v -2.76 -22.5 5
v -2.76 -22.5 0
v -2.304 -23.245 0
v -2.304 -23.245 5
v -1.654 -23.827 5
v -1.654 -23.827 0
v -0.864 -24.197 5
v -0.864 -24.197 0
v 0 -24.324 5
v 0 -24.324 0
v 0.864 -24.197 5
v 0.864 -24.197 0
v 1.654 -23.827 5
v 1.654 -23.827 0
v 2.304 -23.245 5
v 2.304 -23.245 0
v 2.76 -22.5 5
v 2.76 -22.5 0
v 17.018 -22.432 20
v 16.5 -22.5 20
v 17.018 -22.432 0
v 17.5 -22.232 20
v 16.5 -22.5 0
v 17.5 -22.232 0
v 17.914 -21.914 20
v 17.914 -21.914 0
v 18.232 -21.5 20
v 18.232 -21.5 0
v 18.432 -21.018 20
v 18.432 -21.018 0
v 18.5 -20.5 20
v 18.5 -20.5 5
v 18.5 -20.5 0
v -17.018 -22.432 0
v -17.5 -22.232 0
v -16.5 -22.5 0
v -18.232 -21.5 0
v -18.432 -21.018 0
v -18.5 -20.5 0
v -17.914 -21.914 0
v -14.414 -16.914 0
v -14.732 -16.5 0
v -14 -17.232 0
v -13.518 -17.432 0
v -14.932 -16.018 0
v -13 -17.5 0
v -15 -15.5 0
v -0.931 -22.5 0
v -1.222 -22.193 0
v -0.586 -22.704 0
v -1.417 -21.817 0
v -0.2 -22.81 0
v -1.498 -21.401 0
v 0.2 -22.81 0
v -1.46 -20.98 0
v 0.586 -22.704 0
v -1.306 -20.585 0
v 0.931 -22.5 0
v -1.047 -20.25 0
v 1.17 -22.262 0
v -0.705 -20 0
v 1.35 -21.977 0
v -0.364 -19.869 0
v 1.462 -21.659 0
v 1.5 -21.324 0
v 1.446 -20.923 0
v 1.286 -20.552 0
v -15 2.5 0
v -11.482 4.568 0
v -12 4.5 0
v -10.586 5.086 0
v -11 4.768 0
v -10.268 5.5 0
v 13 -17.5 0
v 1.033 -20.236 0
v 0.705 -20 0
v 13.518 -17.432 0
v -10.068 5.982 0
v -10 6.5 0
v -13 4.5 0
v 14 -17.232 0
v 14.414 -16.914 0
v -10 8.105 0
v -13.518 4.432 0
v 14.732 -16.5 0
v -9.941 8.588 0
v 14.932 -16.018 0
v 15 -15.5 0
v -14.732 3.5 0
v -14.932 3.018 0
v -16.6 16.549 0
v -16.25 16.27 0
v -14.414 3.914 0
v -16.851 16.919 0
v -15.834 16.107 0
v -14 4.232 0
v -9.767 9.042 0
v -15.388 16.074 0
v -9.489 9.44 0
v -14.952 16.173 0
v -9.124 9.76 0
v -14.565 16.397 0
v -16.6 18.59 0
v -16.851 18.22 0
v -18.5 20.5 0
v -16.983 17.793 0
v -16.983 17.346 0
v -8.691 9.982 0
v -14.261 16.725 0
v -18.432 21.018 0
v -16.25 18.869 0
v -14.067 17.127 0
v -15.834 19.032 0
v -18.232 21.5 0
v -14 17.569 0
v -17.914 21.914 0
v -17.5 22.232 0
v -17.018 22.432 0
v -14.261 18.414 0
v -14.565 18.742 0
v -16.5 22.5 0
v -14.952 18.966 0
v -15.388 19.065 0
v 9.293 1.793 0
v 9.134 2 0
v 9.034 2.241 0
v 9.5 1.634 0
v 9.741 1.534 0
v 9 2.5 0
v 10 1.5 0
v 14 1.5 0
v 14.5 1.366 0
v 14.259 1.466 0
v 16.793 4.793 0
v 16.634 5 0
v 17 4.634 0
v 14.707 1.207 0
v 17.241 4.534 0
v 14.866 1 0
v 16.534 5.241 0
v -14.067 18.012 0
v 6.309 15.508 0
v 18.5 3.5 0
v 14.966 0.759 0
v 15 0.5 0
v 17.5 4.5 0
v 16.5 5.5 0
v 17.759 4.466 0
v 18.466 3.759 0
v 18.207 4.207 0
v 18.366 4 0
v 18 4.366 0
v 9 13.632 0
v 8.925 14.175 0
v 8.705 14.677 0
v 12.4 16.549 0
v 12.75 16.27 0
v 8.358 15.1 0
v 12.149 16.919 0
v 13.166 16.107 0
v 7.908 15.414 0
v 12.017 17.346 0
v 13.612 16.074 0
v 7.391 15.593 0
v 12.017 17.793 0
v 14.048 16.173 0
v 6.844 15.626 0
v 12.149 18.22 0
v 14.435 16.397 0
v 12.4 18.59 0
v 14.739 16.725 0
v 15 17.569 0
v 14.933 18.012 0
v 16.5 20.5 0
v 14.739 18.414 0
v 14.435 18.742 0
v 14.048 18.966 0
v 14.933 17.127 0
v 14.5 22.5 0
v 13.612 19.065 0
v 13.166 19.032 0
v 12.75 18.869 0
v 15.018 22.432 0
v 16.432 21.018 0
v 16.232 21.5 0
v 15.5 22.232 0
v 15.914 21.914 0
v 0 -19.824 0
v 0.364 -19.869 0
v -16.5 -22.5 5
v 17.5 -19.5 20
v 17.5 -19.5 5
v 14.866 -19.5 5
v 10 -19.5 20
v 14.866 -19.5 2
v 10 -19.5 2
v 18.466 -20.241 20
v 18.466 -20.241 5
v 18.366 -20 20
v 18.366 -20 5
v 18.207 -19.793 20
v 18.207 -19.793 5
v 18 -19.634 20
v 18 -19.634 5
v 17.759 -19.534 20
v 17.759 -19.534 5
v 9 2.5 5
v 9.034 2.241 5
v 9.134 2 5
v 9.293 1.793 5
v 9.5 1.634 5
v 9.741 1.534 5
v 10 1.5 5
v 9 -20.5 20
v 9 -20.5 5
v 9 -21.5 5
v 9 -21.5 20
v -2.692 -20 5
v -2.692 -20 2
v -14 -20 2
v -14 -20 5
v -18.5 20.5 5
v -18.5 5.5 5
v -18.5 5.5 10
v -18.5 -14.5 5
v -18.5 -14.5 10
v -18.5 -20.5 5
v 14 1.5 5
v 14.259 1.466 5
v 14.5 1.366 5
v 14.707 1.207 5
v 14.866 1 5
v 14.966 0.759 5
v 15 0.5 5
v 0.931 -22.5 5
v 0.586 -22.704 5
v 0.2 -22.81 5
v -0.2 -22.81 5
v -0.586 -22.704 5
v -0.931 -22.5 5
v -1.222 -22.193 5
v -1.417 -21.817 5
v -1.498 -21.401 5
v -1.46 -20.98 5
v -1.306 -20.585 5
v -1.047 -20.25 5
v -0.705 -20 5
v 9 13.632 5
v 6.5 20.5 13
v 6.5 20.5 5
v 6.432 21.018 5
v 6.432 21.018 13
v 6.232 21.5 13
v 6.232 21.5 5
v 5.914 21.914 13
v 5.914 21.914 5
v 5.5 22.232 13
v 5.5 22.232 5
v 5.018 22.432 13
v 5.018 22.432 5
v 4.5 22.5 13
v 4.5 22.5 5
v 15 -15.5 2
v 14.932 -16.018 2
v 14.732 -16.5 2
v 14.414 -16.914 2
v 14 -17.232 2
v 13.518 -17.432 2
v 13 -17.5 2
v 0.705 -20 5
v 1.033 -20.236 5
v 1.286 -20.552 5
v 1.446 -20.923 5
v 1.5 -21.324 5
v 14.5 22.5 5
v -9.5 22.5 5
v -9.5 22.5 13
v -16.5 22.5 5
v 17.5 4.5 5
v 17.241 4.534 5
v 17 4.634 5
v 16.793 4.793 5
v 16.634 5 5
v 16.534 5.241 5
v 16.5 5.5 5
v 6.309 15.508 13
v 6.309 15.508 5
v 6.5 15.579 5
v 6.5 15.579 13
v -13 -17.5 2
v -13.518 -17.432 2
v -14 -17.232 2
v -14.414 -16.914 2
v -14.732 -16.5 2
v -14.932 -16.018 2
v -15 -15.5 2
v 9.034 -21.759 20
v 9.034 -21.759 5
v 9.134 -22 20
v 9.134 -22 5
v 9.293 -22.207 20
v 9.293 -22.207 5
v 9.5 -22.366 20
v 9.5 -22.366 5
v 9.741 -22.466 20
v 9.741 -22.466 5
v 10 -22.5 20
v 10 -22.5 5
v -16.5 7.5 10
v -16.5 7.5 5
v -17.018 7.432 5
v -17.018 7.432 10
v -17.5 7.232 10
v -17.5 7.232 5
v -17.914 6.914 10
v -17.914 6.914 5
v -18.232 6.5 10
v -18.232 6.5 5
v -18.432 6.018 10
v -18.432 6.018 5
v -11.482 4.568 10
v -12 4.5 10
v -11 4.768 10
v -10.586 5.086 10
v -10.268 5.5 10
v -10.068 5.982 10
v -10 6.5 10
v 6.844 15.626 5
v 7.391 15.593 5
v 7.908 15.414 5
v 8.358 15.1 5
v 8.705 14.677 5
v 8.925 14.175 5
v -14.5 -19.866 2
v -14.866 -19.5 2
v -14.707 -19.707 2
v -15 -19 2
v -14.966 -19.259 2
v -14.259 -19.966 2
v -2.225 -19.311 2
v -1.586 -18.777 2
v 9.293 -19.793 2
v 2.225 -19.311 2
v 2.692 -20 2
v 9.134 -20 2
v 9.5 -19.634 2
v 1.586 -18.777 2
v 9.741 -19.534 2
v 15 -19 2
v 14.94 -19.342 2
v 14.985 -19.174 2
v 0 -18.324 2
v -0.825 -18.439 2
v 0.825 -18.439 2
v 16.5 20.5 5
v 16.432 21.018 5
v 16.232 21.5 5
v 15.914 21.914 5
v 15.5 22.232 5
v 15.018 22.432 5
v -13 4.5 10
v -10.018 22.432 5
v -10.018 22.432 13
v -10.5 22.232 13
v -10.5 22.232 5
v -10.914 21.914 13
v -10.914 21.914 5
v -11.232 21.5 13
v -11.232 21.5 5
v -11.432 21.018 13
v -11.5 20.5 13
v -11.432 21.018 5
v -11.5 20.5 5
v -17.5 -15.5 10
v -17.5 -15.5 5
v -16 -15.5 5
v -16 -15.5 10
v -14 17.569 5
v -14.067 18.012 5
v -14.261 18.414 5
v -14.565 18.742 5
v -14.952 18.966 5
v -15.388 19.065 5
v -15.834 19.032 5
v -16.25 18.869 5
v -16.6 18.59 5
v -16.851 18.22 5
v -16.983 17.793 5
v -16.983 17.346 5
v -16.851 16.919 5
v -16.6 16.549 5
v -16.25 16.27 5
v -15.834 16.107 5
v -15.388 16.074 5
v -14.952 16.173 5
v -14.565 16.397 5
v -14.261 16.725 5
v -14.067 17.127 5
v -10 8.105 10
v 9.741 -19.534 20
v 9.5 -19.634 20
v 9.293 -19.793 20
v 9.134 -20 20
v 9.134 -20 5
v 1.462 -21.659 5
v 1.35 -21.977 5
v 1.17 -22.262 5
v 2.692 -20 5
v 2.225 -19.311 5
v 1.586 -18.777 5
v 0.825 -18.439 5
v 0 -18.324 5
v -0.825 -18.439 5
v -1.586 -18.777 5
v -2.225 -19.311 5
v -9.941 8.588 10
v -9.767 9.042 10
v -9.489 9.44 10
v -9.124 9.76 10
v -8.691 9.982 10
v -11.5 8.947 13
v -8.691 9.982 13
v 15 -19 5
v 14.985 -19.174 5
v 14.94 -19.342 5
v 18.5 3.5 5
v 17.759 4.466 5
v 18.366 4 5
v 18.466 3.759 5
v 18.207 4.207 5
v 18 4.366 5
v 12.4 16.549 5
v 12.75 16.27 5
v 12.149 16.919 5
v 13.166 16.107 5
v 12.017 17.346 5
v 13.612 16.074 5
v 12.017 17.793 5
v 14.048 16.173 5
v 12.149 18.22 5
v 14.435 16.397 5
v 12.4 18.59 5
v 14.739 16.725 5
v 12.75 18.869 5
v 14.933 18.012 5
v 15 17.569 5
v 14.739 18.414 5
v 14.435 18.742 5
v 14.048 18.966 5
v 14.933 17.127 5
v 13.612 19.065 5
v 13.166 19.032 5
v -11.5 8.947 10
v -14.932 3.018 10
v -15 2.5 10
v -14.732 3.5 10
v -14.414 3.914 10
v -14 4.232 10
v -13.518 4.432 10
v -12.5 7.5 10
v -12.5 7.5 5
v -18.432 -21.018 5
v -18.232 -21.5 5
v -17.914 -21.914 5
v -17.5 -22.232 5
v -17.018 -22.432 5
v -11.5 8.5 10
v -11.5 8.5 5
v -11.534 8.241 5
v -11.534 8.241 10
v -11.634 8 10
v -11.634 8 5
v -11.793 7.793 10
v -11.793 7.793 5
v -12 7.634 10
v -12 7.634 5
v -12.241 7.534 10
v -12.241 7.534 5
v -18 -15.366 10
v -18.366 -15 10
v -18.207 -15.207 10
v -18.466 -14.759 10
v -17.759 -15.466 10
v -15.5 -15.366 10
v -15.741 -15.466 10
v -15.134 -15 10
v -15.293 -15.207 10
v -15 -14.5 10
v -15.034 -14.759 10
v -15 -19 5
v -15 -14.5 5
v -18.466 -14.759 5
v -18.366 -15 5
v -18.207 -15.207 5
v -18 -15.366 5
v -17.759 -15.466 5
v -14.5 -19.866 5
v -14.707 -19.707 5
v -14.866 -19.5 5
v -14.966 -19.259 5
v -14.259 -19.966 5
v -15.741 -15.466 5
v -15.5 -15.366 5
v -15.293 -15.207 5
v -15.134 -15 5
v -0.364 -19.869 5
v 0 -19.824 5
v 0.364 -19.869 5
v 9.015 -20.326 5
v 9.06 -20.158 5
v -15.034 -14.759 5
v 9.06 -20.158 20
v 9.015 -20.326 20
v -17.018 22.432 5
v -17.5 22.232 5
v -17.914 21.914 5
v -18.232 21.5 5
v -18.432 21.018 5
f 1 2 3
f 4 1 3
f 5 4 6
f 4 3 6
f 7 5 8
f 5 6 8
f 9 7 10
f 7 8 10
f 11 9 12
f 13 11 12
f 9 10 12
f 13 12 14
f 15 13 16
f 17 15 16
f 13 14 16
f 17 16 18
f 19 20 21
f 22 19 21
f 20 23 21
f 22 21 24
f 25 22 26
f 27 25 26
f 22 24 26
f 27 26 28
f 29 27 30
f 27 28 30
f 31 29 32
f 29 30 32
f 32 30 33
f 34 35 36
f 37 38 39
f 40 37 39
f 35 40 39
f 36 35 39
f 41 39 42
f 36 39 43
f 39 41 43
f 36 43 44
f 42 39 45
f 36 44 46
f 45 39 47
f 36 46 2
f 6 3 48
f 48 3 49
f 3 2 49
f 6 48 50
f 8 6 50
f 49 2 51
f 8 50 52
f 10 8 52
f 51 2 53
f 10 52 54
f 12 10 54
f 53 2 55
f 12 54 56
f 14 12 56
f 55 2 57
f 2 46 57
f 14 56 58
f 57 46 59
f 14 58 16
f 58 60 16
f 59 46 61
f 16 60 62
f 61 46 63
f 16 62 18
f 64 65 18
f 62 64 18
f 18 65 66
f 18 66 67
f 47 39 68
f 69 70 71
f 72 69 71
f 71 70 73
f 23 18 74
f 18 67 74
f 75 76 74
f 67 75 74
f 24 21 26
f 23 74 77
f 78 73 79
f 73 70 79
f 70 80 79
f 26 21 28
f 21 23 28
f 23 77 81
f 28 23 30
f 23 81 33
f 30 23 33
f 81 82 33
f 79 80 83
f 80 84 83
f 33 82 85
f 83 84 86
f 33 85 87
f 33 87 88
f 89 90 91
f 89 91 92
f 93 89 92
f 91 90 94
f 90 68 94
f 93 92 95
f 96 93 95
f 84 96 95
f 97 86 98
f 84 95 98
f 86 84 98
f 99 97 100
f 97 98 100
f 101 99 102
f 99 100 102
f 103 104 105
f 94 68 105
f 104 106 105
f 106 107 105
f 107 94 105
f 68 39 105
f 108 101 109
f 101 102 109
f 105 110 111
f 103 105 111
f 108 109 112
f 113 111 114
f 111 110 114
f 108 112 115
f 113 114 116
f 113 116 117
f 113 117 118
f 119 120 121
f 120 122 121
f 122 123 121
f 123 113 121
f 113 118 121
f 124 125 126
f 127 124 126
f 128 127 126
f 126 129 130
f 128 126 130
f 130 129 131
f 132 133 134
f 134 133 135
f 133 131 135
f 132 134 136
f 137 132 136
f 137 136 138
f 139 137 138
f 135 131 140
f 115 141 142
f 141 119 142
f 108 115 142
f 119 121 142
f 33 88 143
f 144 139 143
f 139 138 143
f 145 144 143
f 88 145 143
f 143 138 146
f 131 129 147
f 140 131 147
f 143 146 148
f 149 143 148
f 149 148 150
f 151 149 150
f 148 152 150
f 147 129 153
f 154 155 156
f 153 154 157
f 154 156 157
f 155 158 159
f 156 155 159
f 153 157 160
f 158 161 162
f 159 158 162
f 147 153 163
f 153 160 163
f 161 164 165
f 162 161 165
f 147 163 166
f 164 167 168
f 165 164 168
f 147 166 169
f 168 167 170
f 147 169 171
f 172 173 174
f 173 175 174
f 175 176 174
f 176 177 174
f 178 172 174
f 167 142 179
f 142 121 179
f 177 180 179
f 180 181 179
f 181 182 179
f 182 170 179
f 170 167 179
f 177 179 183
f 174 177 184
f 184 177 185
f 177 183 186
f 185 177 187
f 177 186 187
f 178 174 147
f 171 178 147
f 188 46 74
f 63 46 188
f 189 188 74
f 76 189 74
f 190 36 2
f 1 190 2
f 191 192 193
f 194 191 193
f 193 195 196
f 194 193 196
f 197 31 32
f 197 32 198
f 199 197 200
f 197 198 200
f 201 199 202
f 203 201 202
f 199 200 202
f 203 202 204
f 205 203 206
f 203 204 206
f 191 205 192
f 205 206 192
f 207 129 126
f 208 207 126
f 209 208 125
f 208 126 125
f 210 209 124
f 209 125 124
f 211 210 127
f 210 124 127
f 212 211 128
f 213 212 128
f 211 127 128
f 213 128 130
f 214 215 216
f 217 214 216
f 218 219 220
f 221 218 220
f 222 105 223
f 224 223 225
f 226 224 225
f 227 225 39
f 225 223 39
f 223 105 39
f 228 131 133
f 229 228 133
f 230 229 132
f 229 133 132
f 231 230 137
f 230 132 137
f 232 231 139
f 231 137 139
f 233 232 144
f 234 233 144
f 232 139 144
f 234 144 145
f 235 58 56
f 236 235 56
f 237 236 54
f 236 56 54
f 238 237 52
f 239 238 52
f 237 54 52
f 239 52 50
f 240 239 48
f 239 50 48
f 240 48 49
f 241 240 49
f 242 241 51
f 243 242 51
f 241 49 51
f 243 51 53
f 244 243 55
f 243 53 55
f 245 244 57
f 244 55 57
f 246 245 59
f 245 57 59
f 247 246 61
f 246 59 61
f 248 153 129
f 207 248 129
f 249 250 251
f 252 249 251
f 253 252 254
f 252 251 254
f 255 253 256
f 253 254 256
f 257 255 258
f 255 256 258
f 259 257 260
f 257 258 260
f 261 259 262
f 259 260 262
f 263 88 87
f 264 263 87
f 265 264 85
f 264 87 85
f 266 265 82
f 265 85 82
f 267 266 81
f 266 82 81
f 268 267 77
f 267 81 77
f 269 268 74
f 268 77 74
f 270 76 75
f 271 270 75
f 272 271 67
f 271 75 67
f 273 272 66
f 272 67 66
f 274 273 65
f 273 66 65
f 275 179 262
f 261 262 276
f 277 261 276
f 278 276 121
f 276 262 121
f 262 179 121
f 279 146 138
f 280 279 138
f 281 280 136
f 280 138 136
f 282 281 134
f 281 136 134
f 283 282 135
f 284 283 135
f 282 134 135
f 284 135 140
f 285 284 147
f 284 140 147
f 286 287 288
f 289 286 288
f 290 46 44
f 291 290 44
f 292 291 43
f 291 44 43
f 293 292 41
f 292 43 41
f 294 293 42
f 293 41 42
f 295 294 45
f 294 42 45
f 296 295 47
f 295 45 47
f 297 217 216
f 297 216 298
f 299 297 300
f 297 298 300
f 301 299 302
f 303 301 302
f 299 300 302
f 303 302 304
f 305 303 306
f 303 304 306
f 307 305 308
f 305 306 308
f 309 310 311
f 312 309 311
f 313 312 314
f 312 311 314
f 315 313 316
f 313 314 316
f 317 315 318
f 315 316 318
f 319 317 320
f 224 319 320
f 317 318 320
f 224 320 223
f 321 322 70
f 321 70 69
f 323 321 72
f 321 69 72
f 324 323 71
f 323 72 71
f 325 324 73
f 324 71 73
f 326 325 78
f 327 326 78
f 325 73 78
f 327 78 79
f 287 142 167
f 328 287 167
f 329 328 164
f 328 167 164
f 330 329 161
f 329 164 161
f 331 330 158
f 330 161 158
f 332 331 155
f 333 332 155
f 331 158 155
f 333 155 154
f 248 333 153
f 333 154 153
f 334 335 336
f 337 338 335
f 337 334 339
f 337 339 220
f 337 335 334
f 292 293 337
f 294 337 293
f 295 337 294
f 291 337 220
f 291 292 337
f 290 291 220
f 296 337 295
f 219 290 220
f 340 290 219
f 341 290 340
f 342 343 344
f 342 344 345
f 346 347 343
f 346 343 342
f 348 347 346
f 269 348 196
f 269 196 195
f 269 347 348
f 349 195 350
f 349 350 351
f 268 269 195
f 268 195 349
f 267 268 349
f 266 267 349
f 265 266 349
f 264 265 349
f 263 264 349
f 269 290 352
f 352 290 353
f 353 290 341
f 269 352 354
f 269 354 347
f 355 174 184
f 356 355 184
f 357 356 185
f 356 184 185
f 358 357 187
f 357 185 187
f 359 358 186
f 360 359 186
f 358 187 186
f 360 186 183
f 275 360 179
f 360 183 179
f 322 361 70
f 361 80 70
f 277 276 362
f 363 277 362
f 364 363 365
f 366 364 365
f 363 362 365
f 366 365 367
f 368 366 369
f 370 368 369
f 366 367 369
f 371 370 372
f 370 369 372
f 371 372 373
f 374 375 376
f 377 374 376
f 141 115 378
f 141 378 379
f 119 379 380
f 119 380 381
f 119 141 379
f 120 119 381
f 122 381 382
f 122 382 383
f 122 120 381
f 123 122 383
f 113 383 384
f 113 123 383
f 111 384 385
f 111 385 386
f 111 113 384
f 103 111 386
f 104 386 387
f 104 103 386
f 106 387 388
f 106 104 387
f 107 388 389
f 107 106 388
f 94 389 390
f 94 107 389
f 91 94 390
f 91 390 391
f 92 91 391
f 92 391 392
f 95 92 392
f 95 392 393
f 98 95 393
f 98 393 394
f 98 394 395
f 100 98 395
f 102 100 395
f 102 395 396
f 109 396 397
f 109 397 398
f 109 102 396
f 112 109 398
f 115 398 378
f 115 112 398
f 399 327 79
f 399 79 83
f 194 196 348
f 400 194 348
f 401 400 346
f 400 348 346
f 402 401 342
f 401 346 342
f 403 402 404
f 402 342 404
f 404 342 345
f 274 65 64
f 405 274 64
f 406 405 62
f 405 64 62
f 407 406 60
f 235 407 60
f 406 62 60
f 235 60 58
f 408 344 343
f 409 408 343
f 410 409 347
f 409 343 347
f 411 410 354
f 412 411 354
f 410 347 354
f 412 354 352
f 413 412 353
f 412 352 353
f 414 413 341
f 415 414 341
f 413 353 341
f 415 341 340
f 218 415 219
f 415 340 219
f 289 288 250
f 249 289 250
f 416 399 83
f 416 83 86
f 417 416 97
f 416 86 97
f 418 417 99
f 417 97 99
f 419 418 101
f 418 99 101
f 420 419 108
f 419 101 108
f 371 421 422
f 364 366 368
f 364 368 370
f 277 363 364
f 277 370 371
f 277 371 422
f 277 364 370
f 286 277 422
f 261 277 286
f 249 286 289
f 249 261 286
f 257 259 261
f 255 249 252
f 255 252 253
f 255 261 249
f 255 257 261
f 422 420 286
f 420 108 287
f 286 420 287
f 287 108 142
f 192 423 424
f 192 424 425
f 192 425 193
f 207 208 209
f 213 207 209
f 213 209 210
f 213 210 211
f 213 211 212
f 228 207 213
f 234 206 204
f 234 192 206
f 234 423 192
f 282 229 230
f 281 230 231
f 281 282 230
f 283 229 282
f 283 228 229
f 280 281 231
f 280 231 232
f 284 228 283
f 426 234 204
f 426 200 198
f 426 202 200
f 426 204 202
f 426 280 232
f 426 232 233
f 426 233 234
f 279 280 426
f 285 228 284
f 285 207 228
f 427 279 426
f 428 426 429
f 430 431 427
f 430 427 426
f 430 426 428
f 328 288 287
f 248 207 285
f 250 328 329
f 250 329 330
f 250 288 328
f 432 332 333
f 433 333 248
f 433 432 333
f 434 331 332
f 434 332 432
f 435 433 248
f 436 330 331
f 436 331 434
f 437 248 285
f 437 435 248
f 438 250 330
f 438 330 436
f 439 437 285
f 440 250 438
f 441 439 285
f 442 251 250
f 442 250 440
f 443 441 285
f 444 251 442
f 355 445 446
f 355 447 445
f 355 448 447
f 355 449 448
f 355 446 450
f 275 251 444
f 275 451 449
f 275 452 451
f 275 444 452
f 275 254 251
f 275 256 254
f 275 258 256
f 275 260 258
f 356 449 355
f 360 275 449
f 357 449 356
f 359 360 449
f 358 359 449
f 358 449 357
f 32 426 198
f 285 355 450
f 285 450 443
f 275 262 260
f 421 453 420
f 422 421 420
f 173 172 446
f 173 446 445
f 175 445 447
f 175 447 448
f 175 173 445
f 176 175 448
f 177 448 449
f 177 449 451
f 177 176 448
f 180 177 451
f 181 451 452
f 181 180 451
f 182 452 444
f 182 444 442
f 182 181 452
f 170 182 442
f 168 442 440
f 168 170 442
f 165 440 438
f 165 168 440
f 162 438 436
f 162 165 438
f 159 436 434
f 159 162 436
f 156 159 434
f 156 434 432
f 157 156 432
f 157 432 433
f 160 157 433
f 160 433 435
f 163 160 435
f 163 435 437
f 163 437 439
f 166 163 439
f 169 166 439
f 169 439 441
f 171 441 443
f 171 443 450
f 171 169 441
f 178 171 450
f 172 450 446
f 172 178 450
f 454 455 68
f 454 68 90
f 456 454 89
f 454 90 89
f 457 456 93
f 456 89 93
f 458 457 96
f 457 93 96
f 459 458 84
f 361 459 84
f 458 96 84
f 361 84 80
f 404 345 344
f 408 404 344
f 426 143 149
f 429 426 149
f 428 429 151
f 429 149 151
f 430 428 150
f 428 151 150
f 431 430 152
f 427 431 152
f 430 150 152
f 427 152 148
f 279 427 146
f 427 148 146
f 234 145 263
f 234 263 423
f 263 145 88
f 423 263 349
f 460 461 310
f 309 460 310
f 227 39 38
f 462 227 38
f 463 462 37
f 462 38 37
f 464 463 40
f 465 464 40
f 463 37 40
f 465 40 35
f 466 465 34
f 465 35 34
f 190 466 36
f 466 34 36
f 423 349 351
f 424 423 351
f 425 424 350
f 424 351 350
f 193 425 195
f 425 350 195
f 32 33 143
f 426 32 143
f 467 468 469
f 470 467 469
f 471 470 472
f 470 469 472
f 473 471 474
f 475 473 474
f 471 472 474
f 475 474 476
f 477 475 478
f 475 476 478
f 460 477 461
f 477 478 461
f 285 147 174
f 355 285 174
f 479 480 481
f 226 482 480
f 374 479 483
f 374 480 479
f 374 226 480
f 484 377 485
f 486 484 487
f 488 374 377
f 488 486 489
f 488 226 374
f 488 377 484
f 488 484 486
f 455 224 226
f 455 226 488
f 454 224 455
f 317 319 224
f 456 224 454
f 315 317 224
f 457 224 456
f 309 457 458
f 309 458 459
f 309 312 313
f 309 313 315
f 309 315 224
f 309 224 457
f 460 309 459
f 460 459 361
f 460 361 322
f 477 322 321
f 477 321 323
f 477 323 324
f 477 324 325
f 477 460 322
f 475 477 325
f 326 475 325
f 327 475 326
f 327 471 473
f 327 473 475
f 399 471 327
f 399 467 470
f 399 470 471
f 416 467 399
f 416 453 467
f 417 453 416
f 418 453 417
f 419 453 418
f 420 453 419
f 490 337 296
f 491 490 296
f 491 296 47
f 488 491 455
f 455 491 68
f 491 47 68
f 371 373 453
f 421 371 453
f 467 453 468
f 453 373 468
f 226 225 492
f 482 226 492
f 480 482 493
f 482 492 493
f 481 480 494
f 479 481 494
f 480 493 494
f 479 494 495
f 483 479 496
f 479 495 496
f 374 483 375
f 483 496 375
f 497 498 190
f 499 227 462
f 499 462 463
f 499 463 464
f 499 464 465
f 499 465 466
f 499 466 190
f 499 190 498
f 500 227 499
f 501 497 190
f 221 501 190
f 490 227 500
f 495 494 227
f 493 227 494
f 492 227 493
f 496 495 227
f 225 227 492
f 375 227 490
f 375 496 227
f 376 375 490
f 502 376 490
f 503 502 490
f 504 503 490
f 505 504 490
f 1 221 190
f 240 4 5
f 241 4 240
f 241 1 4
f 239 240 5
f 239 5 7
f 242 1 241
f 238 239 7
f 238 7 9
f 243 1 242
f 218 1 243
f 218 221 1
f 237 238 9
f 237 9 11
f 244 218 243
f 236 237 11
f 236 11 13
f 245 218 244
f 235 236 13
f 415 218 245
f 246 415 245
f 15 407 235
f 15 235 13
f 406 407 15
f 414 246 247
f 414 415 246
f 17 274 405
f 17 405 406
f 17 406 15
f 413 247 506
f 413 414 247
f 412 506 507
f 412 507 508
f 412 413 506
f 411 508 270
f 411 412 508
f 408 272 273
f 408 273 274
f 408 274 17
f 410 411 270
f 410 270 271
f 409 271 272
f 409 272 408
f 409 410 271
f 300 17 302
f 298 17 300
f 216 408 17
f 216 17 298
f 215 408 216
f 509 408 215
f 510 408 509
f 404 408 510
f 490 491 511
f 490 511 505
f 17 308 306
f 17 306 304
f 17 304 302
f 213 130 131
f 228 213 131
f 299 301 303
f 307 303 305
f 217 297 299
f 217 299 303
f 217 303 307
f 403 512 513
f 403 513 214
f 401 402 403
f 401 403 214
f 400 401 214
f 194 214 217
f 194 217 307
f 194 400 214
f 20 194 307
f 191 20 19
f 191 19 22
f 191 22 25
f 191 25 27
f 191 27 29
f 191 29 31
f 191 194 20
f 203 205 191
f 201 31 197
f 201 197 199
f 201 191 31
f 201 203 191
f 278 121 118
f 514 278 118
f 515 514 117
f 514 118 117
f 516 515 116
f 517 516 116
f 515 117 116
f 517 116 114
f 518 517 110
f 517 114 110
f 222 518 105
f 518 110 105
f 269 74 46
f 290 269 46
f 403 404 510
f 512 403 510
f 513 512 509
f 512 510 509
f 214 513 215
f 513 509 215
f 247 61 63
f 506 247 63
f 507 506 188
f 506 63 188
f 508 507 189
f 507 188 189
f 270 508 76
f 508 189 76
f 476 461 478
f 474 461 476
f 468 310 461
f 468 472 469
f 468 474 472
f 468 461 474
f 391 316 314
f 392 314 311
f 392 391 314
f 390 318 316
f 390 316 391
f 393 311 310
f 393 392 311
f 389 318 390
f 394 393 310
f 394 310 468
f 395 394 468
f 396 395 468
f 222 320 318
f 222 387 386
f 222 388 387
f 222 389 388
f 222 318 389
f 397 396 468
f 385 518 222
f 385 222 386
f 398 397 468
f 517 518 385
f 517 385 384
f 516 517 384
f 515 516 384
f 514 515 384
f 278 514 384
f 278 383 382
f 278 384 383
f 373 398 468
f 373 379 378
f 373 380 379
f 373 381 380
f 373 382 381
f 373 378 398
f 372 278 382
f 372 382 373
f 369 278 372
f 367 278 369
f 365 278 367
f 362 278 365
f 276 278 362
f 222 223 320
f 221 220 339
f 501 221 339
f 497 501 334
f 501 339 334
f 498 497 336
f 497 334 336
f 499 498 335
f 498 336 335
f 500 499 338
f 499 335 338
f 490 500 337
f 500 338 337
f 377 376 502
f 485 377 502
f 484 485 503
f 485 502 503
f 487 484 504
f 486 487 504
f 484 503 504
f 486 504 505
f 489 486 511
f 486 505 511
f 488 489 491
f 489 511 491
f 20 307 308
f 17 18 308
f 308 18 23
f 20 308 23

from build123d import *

# Parameters (mm, degrees)
F1_DEPTH = 2
F0_R     = 3
F0_R_2   = 1.5
F2_DEPTH = 5
F4_DEPTH = 5
F5_DEPTH = 8
F6_DEPTH = 4
F7_DEPTH = 15


with BuildPart() as f1:
    # F0 (on Top) → F1 (new body)
    with BuildSketch(Plane.XY):
        with BuildLine():
            Line((-14, -20), (-2.69212803, -20))
            ThreePointArc((-2.69212803, -20), (0, -18.323800087), (2.69212803, -20))
            Line((2.69212803, -20), (14, -20))
            ThreePointArc((14, -20), (14.7071067812, -19.7071067812), (15, -19))
            Line((15, -19), (15, -15.5))
            ThreePointArc((15, -15.5), (14.4142135624, -16.9142135624), (13, -17.5))
            Line((13, -17.5), (-13, -17.5))
            ThreePointArc((-13, -17.5), (-14.4142135624, -16.9142135624), (-15, -15.5))
            Line((-15, -15.5), (-15, -19))
            ThreePointArc((-15, -19), (-14.7071067812, -19.7071067812), (-14, -20))
        make_face()
    extrude(amount=F1_DEPTH)

    # F0 (on Top) → F2 (join)
    with BuildSketch(Plane.XY):
        with BuildLine():
            Line((2.7598104581, -22.5), (16.5, -22.5))
            ThreePointArc((16.5, -22.5), (17.9142135624, -21.9142135624), (18.5, -20.5))
            Line((18.5, -20.5), (18.5, 3.5))
            ThreePointArc((18.5, 3.5), (18.2071067812, 4.2071067812), (17.5, 4.5))
            ThreePointArc((17.5, 4.5), (16.7928932188, 4.7928932188), (16.5, 5.5))
            Line((16.5, 5.5), (16.5, 17.5694916397))
            Line((16.5, 17.5694916397), (16.5, 20.5))
            ThreePointArc((16.5, 20.5), (15.9142135624, 21.9142135624), (14.5, 22.5))
            Line((14.5, 22.5), (-16.5, 22.5))
            ThreePointArc((-16.5, 22.5), (-17.9142135624, 21.9142135624), (-18.5, 20.5))
            Line((-18.5, 20.5), (-18.5, 17.5694916397))
            Line((-18.5, 17.5694916397), (-18.5, -20.5))
            ThreePointArc((-18.5, -20.5), (-17.9142135624, -21.9142135624), (-16.5, -22.5))
            Line((-16.5, -22.5), (-2.7598104581, -22.5))
            ThreePointArc((-2.7598104581, -22.5), (-2.9989011853, -21.2426109214), (-2.69212803, -20))
            Line((-2.69212803, -20), (-14, -20))
            ThreePointArc((-14, -20), (-14.7071067812, -19.7071067812), (-15, -19))
            Line((-15, -19), (-15, -15.5))
            Line((-15, -15.5), (-15, 2.5))
            ThreePointArc((-15, 2.5), (-14.4142135624, 3.9142135624), (-13, 4.5))
            Line((-13, 4.5), (-12, 4.5))
            ThreePointArc((-12, 4.5), (-10.5857864376, 5.0857864376), (-10, 6.5))
            Line((-10, 6.5), (-10, 8.1054256072))
            ThreePointArc((-10, 8.1054256072), (-9.6405519552, 9.2493614806), (-8.6914107177, 9.9821118409))
            Line((-8.6914107177, 9.9821118409), (6.3085892823, 15.5084276303))
            ThreePointArc((6.3085892823, 15.5084276303), (8.1439358734, 15.2722933519), (9, 13.6317413967))
            Line((9, 13.6317413967), (9, 2.5))
            ThreePointArc((9, 2.5), (9.2928932188, 1.7928932188), (10, 1.5))
            Line((10, 1.5), (14, 1.5))
            ThreePointArc((14, 1.5), (14.7071067812, 1.2071067812), (15, 0.5))
            Line((15, 0.5), (15, -15.5))
            Line((15, -15.5), (15, -19))
            ThreePointArc((15, -19), (14.7071067812, -19.7071067812), (14, -20))
            Line((14, -20), (2.69212803, -20))
            ThreePointArc((2.69212803, -20), (2.9220184881, -20.6442355536), (3, -21.323800087))
            ThreePointArc((3, -21.323800087), (2.9393393283, -21.9240369676), (2.7598104581, -22.5))
        make_face()
        with BuildLine():
            ThreePointArc((-12.5, 17.5694916397), (-15.5, 14.5694916397), (-18.5, 17.5694916397))
            ThreePointArc((-18.5, 17.5694916397), (-15.5, 20.5694916397), (-12.5, 17.5694916397))
        make_face(mode=Mode.SUBTRACT)
        with Locations((13.5, 17.5694916397)):
            Circle(F0_R, mode=Mode.SUBTRACT)
        with BuildLine():
            ThreePointArc((2.69212803, -20), (0, -18.323800087), (-2.69212803, -20))
            Line((-2.69212803, -20), (-0.7053746024, -20))
            ThreePointArc((-0.7053746024, -20), (0, -19.823800087), (0.7053746024, -20))
            Line((0.7053746024, -20), (2.69212803, -20))
        make_face()
        with BuildLine():
            ThreePointArc((-2.69212803, -20), (-2.9989011853, -21.2426109214), (-2.7598104581, -22.5))
            Line((-2.7598104581, -22.5), (-0.9308886961, -22.5))
            ThreePointArc((-0.9308886961, -22.5), (-1.4939342005, -21.1890388), (-0.7053746024, -20))
            Line((-0.7053746024, -20), (-2.69212803, -20))
        make_face()
        with BuildLine():
            Line((0.9308886961, -22.5), (2.7598104581, -22.5))
            ThreePointArc((2.7598104581, -22.5), (2.9393393283, -21.9240369676), (3, -21.323800087))
            ThreePointArc((3, -21.323800087), (2.9220184881, -20.6442355536), (2.69212803, -20))
            Line((2.69212803, -20), (0.7053746024, -20))
            ThreePointArc((0.7053746024, -20), (1.2860913466, -20.5518097708), (1.5, -21.323800087))
            ThreePointArc((1.5, -21.323800087), (1.3502468375, -21.9771250275), (0.9308886961, -22.5))
        make_face()
        with BuildLine():
            ThreePointArc((-2.7598104581, -22.5), (0, -24.323800087), (2.7598104581, -22.5))
            Line((2.7598104581, -22.5), (0.9308886961, -22.5))
            ThreePointArc((0.9308886961, -22.5), (0, -22.823800087), (-0.9308886961, -22.5))
            Line((-0.9308886961, -22.5), (-2.7598104581, -22.5))
        make_face()
        with BuildLine():
            ThreePointArc((-12.5, 17.5694916397), (-15.5, 20.5694916397), (-18.5, 17.5694916397))
            ThreePointArc((-18.5, 17.5694916397), (-15.5, 14.5694916397), (-12.5, 17.5694916397))
        make_face()
        with Locations((-15.5, 17.5694916397)):
            Circle(F0_R_2, mode=Mode.SUBTRACT)
        with Locations((13.5, 17.5694916397)):
            Circle(F0_R)
        with Locations((13.5, 17.5694916397)):
            Circle(F0_R_2, mode=Mode.SUBTRACT)
    extrude(amount=F2_DEPTH)

    # F3 (on face) → F4 (join)
    with BuildSketch(Plane.XY.offset(5)):
        with BuildLine():
            ThreePointArc((-18.5, -14.5), (-18.2071067812, -15.2071067812), (-17.5, -15.5))
            Line((-17.5, -15.5), (-16, -15.5))
            ThreePointArc((-16, -15.5), (-15.2928932188, -15.2071067812), (-15, -14.5))
            Line((-15, -14.5), (-15, 2.5))
            ThreePointArc((-15, 2.5), (-14.4142135624, 3.9142135624), (-13, 4.5))
            Line((-13, 4.5), (-12, 4.5))
            ThreePointArc((-12, 4.5), (-10.5857864376, 5.0857864376), (-10, 6.5))
            Line((-10, 6.5), (-10, 8.1054256072))
            ThreePointArc((-10, 8.1054256072), (-9.6405519552, 9.2493614806), (-8.6914107177, 9.9821118409))
            Line((-8.6914107177, 9.9821118409), (-11.5, 8.9473684211))
            Line((-11.5, 8.9473684211), (-11.5, 8.5))
            ThreePointArc((-11.5, 8.5), (-11.7928932188, 7.7928932188), (-12.5, 7.5))
            Line((-12.5, 7.5), (-16.5, 7.5))
            ThreePointArc((-16.5, 7.5), (-17.9142135624, 6.9142135624), (-18.5, 5.5))
            Line((-18.5, 5.5), (-18.5, -14.5))
        make_face()
    extrude(amount=F4_DEPTH)

    # F3 (on face) → F5 (join)
    with BuildSketch(Plane.XY.offset(5)):
        with BuildLine():
            Line((4.5, 22.5), (-9.5, 22.5))
            ThreePointArc((-9.5, 22.5), (-10.9142135624, 21.9142135624), (-11.5, 20.5))
            Line((-11.5, 20.5), (-11.5, 8.9473684211))
            Line((-11.5, 8.9473684211), (-8.6914107177, 9.9821118409))
            Line((-8.6914107177, 9.9821118409), (6.3085892823, 15.5084276303))
            Line((6.3085892823, 15.5084276303), (6.5, 15.5789473684))
            Line((6.5, 15.5789473684), (6.5, 20.5))
            ThreePointArc((6.5, 20.5), (5.9142135624, 21.9142135624), (4.5, 22.5))
        make_face()
    extrude(amount=F5_DEPTH)

    # F3 (on face) → F6 (join)
    with BuildSketch(Plane.XY.offset(5)):
        with BuildLine():
            ThreePointArc((10, -19.5), (9.5, -19.6339745962), (9.1339745962, -20))
            Line((9.1339745962, -20), (14, -20))
            ThreePointArc((14, -20), (14.5, -19.8660254038), (14.8660254038, -19.5))
            Line((14.8660254038, -19.5), (10, -19.5))
        make_face()
        with BuildLine():
            ThreePointArc((9, -21.5), (9.2928932188, -22.2071067812), (10, -22.5))
            Line((10, -22.5), (16.5, -22.5))
            ThreePointArc((16.5, -22.5), (17.9142135624, -21.9142135624), (18.5, -20.5))
            ThreePointArc((18.5, -20.5), (18.2071067812, -19.7928932188), (17.5, -19.5))
            Line((17.5, -19.5), (14.8660254038, -19.5))
            ThreePointArc((14.8660254038, -19.5), (14.5, -19.8660254038), (14, -20))
            Line((14, -20), (9.1339745962, -20))
            ThreePointArc((9.1339745962, -20), (9.0340741737, -20.2411809549), (9, -20.5))
            Line((9, -20.5), (9, -21.5))
        make_face()
    extrude(amount=-F6_DEPTH)

    # F3 (on face) → F7 (join)
    with BuildSketch(Plane.XY.offset(5)):
        with BuildLine():
            ThreePointArc((10, -19.5), (9.5, -19.6339745962), (9.1339745962, -20))
            Line((9.1339745962, -20), (14, -20))
            ThreePointArc((14, -20), (14.5, -19.8660254038), (14.8660254038, -19.5))
            Line((14.8660254038, -19.5), (10, -19.5))
        make_face()
        with BuildLine():
            ThreePointArc((9, -21.5), (9.2928932188, -22.2071067812), (10, -22.5))
            Line((10, -22.5), (16.5, -22.5))
            ThreePointArc((16.5, -22.5), (17.9142135624, -21.9142135624), (18.5, -20.5))
            ThreePointArc((18.5, -20.5), (18.2071067812, -19.7928932188), (17.5, -19.5))
            Line((17.5, -19.5), (14.8660254038, -19.5))
            ThreePointArc((14.8660254038, -19.5), (14.5, -19.8660254038), (14, -20))
            Line((14, -20), (9.1339745962, -20))
            ThreePointArc((9.1339745962, -20), (9.0340741737, -20.2411809549), (9, -20.5))
            Line((9, -20.5), (9, -21.5))
        make_face()
    extrude(amount=F7_DEPTH)


solid = f1.part
